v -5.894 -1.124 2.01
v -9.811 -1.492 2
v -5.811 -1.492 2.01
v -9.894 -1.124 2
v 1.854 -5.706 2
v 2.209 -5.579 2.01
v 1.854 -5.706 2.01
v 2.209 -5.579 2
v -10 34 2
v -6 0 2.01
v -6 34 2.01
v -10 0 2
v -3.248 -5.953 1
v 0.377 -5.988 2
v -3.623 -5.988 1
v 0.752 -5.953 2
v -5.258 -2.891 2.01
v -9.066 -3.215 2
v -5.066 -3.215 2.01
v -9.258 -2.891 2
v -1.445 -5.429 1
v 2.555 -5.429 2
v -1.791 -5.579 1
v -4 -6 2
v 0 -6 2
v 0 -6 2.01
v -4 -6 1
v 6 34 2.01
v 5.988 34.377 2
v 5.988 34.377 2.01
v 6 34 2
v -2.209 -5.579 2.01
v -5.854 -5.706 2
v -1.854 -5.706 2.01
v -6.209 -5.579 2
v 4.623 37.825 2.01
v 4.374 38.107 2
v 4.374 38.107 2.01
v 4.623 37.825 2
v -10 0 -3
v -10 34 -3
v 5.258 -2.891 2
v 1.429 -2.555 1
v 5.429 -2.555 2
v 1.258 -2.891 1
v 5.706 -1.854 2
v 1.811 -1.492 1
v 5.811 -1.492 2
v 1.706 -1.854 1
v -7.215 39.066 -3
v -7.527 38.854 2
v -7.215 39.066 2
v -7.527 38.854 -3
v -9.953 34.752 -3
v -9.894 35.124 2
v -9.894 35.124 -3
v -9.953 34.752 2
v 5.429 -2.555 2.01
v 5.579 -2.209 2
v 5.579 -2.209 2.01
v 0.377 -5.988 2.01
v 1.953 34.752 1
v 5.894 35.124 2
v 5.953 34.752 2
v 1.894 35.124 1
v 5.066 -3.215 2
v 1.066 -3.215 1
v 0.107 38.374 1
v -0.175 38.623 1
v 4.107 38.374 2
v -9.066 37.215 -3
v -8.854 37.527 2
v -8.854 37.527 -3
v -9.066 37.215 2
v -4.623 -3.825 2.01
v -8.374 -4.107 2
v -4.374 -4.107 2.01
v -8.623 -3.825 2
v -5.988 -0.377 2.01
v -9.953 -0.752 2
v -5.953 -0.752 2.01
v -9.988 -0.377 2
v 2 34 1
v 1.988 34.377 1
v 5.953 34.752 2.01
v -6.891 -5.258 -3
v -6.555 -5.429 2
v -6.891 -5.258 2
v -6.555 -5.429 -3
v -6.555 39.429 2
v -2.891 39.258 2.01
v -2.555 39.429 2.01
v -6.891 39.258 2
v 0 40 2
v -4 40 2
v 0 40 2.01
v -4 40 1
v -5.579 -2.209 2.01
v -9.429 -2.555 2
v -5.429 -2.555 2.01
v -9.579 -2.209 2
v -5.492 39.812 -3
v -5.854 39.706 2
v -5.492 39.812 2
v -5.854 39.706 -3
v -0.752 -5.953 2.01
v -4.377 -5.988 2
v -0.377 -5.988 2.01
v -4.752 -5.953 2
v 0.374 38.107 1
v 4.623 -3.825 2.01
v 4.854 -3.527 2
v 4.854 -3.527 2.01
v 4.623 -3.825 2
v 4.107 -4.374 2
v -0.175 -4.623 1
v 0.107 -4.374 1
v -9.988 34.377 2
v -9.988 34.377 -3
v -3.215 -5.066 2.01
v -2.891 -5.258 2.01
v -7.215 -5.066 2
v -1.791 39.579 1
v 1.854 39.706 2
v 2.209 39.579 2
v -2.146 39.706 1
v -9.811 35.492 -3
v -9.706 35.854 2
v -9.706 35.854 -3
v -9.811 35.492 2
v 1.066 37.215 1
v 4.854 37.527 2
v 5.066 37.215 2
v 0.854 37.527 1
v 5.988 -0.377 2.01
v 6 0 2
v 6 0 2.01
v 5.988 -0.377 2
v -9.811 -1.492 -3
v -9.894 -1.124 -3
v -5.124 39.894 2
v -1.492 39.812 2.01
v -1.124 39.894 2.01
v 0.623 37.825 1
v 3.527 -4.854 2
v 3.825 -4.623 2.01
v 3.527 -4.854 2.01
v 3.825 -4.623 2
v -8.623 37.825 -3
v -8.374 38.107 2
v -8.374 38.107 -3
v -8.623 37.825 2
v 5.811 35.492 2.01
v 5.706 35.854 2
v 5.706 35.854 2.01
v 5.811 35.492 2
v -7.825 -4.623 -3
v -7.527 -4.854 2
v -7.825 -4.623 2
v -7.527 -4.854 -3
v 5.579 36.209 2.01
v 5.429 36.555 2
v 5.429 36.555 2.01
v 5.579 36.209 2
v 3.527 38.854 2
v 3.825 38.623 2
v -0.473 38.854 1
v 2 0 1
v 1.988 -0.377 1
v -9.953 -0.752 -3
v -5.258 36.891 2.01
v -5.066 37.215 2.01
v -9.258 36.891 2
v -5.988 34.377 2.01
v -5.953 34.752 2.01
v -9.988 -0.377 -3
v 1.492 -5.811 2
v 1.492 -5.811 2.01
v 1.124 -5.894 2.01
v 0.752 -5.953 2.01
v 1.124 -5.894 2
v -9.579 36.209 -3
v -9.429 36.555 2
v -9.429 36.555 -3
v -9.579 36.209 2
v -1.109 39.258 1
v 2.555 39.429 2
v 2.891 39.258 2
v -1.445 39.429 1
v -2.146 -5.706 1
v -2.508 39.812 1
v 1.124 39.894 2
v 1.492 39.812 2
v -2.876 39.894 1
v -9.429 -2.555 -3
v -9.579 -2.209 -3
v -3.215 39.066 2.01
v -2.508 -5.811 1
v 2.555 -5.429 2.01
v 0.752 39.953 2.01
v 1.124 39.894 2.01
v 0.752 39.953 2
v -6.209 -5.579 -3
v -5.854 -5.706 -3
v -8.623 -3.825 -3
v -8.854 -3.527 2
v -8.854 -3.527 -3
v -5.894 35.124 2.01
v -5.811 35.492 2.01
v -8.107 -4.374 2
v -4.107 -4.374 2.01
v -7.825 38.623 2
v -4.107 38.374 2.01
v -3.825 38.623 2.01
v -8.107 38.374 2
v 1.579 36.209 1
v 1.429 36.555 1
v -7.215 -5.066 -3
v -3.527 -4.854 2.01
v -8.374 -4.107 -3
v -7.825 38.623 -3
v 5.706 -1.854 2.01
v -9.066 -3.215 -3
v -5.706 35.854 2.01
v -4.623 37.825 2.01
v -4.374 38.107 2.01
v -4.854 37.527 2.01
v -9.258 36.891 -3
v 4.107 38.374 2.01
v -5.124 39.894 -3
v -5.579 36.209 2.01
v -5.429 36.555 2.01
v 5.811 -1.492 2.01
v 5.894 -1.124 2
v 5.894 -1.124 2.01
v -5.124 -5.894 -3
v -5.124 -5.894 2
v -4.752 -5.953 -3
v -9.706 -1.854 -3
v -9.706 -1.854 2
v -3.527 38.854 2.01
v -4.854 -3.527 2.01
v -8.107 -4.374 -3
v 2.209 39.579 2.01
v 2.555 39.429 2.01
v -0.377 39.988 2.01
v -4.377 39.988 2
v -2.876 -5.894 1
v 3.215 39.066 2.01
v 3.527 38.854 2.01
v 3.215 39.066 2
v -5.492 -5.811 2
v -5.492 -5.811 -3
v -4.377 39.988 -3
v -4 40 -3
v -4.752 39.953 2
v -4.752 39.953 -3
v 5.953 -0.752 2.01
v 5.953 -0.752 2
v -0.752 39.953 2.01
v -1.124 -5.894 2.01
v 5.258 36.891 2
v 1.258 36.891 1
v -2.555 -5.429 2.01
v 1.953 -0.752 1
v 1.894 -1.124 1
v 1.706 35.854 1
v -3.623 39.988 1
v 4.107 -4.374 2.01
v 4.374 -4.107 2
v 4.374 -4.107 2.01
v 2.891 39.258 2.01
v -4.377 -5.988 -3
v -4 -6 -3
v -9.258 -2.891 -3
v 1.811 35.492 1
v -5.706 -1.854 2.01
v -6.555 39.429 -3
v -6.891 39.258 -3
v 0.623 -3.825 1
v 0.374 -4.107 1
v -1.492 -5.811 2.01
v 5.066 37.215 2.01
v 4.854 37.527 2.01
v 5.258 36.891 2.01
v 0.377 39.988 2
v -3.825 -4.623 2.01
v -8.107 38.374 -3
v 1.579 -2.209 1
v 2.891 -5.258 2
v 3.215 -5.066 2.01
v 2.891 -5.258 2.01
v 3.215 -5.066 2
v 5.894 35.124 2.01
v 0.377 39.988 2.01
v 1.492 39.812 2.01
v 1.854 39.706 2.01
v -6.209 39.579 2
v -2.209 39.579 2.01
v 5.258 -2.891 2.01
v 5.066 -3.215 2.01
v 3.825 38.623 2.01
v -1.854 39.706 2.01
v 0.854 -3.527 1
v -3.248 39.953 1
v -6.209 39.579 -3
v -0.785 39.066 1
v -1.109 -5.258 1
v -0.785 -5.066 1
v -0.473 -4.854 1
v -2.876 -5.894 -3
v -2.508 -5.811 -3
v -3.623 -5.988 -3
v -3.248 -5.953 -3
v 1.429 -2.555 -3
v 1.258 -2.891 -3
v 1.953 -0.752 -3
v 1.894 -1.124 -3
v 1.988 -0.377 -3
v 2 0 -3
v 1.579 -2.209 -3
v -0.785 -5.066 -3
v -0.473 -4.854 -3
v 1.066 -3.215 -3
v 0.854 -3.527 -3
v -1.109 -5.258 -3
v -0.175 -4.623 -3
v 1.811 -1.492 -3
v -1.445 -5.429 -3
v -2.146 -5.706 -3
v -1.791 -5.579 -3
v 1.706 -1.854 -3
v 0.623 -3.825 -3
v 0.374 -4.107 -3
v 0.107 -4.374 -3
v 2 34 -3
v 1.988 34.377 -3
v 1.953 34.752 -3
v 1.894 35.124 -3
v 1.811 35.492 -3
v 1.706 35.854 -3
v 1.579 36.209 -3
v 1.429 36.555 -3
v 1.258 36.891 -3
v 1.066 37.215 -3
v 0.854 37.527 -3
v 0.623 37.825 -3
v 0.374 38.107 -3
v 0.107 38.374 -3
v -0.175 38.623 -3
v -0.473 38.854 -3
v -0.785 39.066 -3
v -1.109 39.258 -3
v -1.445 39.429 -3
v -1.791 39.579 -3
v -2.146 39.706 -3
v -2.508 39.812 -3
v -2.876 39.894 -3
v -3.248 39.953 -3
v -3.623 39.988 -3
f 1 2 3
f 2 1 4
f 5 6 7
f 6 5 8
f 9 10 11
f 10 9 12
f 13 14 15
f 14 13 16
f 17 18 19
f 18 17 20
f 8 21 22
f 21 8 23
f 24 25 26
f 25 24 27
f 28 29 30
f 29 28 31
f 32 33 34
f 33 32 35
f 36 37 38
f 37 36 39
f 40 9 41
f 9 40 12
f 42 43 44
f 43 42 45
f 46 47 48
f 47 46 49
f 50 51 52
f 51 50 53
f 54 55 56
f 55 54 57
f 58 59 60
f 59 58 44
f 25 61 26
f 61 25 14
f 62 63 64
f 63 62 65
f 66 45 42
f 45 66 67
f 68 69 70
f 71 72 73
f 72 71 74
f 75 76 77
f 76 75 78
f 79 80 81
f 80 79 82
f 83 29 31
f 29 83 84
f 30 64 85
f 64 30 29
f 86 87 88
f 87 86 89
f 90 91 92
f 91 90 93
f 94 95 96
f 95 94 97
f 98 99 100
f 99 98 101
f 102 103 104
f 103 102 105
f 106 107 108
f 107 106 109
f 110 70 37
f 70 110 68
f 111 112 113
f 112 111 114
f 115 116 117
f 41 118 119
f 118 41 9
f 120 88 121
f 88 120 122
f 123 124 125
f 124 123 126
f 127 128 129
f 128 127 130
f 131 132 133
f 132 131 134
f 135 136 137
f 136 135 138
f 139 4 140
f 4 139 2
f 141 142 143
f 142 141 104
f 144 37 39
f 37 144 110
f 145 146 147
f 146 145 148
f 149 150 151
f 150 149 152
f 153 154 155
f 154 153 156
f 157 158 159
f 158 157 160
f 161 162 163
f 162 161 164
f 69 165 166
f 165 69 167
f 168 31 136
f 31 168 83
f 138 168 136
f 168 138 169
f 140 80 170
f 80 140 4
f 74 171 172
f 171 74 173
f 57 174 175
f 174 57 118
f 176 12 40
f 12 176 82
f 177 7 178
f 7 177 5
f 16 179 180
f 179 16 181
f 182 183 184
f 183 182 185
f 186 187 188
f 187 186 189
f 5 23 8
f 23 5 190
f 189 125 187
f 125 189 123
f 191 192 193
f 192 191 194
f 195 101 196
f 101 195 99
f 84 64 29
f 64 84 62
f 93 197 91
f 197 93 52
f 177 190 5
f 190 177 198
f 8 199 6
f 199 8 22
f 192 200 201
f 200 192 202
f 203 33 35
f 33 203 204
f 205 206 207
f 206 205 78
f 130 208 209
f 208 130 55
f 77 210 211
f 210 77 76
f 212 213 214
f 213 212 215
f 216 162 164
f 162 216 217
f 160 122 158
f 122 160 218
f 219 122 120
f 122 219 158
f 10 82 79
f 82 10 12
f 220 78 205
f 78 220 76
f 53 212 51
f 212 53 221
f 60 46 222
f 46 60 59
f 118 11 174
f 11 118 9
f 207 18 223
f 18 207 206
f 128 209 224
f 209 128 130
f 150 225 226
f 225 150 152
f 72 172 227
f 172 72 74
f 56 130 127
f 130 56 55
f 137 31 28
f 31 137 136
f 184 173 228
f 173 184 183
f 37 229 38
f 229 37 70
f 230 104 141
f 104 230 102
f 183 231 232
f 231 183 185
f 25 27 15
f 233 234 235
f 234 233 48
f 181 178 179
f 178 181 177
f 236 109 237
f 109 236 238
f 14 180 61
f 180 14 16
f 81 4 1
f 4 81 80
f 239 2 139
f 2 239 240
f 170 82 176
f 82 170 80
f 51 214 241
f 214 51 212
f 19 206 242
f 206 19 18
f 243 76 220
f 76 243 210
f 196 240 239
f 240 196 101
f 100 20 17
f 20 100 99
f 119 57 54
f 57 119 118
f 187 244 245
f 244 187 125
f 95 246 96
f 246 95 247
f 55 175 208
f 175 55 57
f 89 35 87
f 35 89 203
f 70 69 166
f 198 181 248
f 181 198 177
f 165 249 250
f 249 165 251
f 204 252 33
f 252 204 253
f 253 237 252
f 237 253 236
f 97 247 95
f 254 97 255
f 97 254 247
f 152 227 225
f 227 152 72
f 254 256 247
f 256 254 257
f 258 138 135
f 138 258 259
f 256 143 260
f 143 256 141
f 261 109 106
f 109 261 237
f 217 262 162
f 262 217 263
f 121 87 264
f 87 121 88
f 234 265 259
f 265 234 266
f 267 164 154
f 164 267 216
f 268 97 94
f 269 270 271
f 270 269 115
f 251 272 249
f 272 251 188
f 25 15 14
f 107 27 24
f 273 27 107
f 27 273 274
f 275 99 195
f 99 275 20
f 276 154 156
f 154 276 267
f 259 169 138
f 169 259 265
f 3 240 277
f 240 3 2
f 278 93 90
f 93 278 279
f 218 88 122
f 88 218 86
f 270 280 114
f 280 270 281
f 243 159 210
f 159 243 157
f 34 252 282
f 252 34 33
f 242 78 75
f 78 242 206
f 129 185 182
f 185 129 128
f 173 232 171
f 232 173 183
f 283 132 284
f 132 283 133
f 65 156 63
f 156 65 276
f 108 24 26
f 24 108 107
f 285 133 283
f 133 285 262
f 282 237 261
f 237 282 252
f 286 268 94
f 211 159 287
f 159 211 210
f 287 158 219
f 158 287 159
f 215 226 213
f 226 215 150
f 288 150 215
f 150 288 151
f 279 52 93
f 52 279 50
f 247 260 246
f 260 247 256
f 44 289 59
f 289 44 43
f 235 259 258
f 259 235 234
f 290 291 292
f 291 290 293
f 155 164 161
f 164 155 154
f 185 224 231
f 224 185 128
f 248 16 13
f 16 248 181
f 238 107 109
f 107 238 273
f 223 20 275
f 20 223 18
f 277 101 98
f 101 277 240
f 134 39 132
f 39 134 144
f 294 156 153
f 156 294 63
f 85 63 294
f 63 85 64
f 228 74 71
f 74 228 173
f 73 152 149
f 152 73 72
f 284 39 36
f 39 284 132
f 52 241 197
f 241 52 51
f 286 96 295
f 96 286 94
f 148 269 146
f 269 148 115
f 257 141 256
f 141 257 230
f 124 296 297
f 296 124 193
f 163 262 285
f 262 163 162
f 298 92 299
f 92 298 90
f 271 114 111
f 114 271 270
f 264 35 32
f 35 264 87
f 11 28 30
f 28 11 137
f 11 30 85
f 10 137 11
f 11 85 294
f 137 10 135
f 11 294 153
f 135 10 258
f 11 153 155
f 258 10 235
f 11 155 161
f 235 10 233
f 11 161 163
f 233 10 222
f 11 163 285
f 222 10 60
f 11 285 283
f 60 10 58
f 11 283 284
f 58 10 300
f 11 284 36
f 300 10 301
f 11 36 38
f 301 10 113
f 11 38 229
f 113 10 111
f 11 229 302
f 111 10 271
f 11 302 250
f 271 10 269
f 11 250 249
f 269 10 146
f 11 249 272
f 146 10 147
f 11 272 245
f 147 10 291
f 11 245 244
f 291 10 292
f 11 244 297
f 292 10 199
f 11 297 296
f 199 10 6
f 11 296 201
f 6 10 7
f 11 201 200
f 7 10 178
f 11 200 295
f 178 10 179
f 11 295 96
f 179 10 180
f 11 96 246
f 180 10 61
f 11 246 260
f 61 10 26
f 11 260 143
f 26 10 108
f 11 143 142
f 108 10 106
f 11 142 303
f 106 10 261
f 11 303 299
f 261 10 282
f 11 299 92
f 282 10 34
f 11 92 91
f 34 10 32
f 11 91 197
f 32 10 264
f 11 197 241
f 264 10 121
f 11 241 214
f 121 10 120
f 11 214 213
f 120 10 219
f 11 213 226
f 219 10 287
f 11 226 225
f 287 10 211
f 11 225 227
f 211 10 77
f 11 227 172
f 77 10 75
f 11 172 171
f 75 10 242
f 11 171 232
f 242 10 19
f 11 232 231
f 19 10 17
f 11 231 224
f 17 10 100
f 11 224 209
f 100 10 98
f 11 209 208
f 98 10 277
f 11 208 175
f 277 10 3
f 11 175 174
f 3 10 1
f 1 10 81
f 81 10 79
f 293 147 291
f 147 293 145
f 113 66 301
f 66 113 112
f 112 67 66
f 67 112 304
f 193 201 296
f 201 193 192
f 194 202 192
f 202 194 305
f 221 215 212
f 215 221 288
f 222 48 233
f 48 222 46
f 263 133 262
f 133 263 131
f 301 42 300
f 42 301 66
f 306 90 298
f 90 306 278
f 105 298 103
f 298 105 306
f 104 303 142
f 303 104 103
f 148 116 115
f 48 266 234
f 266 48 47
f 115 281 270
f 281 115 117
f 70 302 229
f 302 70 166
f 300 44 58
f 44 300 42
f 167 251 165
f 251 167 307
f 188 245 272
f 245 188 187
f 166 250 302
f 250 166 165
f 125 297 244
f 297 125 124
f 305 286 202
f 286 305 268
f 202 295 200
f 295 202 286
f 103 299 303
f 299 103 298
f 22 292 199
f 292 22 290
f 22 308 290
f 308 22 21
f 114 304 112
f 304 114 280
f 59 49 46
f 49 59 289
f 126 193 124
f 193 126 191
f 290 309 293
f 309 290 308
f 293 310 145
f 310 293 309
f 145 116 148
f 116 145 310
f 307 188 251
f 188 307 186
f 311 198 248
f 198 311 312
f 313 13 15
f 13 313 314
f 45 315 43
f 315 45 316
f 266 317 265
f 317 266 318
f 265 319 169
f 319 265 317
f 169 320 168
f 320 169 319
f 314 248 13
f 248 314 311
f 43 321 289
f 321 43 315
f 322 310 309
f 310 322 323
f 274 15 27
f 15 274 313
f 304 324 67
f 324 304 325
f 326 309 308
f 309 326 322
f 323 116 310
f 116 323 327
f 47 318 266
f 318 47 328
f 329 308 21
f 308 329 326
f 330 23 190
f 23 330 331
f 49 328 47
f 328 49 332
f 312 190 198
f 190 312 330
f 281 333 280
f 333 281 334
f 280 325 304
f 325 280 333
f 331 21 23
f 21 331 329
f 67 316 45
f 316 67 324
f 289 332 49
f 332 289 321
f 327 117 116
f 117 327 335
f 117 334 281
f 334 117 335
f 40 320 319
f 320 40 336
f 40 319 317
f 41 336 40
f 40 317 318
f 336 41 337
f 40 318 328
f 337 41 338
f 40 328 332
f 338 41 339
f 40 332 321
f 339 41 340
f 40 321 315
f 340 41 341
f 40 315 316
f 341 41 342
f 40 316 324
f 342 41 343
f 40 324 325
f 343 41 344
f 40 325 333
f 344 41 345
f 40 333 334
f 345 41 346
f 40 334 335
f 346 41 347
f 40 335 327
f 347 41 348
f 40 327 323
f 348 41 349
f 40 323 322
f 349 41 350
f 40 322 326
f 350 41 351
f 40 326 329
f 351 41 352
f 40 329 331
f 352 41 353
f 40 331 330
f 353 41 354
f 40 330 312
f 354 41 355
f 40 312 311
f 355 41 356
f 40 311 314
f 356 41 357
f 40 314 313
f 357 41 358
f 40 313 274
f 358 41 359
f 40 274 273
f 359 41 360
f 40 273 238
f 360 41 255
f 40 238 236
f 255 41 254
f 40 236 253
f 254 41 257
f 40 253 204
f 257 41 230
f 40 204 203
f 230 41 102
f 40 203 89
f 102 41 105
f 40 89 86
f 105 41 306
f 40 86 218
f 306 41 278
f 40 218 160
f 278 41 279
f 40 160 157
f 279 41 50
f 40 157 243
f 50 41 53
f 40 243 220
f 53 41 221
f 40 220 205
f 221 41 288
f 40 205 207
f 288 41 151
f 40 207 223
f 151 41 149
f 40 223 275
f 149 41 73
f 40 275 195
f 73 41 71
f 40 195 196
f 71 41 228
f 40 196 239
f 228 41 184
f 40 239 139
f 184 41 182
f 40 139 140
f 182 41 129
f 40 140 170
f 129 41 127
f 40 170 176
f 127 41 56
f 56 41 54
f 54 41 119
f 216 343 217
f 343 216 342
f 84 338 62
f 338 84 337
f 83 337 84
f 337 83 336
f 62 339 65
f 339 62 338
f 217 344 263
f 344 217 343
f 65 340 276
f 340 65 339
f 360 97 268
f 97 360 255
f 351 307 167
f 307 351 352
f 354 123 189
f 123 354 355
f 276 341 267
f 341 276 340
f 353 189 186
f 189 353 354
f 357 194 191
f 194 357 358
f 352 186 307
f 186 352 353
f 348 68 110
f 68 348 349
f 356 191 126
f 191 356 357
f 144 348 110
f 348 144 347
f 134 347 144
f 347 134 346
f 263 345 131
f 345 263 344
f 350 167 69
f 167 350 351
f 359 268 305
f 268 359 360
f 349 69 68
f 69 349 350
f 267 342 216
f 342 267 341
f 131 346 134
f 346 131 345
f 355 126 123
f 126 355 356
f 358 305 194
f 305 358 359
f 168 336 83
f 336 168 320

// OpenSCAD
module funnel(){

difference(){
    union(){
        cylinder(h=4, d=14, $fn=100);
        translate([-7,0,0]){cube([14,34,4]);};
        translate([0,34,0]){cylinder(h=4, d=14, $fn=100);};
    };
    union(){
        translate([0,0,-1])cylinder(h=6, d=13, $fn=100);
        translate([-6.5,0,-1]){cube([13,34,6]);};
        translate([0,34,-1])cylinder(h=6, d=13, $fn=100);
        
    };
};
};

hull(){
    translate([0,0,2])cylinder(h=0.01, d=12, $fn=100);
    translate([0,34,2])cylinder(h=0.01, d=12, $fn=100);
    translate([-6,0,2])cube([12,34,0.01]);

    translate([-4,0,1])cylinder(h=1, d=12, $fn=100);
    translate([-4,34,1])cylinder(h=1, d=12, $fn=100);
    translate([-10,0,1])cube([12,34,1]);
 
};

translate([-4,0,-3])cylinder(h=5, d=12, $fn=100);
translate([-4,34,-3])cylinder(h=5, d=12, $fn=100);
translate([-10,0,-3])cube([12,34,5]);


module whatever(){
    translate([0,0,0])cylinder(h=2, d=12, $fn=100);
    translate([0,34,0])cylinder(h=2, d=12, $fn=100);
    translate([-6,0,0])cube([12,34,2]);

    translate([-4,0,0])cylinder(h=2, d=12, $fn=100);
    translate([-4,34,0])cylinder(h=2, d=12, $fn=100);
    translate([-10,0,0])cube([12,34,2]);
};
